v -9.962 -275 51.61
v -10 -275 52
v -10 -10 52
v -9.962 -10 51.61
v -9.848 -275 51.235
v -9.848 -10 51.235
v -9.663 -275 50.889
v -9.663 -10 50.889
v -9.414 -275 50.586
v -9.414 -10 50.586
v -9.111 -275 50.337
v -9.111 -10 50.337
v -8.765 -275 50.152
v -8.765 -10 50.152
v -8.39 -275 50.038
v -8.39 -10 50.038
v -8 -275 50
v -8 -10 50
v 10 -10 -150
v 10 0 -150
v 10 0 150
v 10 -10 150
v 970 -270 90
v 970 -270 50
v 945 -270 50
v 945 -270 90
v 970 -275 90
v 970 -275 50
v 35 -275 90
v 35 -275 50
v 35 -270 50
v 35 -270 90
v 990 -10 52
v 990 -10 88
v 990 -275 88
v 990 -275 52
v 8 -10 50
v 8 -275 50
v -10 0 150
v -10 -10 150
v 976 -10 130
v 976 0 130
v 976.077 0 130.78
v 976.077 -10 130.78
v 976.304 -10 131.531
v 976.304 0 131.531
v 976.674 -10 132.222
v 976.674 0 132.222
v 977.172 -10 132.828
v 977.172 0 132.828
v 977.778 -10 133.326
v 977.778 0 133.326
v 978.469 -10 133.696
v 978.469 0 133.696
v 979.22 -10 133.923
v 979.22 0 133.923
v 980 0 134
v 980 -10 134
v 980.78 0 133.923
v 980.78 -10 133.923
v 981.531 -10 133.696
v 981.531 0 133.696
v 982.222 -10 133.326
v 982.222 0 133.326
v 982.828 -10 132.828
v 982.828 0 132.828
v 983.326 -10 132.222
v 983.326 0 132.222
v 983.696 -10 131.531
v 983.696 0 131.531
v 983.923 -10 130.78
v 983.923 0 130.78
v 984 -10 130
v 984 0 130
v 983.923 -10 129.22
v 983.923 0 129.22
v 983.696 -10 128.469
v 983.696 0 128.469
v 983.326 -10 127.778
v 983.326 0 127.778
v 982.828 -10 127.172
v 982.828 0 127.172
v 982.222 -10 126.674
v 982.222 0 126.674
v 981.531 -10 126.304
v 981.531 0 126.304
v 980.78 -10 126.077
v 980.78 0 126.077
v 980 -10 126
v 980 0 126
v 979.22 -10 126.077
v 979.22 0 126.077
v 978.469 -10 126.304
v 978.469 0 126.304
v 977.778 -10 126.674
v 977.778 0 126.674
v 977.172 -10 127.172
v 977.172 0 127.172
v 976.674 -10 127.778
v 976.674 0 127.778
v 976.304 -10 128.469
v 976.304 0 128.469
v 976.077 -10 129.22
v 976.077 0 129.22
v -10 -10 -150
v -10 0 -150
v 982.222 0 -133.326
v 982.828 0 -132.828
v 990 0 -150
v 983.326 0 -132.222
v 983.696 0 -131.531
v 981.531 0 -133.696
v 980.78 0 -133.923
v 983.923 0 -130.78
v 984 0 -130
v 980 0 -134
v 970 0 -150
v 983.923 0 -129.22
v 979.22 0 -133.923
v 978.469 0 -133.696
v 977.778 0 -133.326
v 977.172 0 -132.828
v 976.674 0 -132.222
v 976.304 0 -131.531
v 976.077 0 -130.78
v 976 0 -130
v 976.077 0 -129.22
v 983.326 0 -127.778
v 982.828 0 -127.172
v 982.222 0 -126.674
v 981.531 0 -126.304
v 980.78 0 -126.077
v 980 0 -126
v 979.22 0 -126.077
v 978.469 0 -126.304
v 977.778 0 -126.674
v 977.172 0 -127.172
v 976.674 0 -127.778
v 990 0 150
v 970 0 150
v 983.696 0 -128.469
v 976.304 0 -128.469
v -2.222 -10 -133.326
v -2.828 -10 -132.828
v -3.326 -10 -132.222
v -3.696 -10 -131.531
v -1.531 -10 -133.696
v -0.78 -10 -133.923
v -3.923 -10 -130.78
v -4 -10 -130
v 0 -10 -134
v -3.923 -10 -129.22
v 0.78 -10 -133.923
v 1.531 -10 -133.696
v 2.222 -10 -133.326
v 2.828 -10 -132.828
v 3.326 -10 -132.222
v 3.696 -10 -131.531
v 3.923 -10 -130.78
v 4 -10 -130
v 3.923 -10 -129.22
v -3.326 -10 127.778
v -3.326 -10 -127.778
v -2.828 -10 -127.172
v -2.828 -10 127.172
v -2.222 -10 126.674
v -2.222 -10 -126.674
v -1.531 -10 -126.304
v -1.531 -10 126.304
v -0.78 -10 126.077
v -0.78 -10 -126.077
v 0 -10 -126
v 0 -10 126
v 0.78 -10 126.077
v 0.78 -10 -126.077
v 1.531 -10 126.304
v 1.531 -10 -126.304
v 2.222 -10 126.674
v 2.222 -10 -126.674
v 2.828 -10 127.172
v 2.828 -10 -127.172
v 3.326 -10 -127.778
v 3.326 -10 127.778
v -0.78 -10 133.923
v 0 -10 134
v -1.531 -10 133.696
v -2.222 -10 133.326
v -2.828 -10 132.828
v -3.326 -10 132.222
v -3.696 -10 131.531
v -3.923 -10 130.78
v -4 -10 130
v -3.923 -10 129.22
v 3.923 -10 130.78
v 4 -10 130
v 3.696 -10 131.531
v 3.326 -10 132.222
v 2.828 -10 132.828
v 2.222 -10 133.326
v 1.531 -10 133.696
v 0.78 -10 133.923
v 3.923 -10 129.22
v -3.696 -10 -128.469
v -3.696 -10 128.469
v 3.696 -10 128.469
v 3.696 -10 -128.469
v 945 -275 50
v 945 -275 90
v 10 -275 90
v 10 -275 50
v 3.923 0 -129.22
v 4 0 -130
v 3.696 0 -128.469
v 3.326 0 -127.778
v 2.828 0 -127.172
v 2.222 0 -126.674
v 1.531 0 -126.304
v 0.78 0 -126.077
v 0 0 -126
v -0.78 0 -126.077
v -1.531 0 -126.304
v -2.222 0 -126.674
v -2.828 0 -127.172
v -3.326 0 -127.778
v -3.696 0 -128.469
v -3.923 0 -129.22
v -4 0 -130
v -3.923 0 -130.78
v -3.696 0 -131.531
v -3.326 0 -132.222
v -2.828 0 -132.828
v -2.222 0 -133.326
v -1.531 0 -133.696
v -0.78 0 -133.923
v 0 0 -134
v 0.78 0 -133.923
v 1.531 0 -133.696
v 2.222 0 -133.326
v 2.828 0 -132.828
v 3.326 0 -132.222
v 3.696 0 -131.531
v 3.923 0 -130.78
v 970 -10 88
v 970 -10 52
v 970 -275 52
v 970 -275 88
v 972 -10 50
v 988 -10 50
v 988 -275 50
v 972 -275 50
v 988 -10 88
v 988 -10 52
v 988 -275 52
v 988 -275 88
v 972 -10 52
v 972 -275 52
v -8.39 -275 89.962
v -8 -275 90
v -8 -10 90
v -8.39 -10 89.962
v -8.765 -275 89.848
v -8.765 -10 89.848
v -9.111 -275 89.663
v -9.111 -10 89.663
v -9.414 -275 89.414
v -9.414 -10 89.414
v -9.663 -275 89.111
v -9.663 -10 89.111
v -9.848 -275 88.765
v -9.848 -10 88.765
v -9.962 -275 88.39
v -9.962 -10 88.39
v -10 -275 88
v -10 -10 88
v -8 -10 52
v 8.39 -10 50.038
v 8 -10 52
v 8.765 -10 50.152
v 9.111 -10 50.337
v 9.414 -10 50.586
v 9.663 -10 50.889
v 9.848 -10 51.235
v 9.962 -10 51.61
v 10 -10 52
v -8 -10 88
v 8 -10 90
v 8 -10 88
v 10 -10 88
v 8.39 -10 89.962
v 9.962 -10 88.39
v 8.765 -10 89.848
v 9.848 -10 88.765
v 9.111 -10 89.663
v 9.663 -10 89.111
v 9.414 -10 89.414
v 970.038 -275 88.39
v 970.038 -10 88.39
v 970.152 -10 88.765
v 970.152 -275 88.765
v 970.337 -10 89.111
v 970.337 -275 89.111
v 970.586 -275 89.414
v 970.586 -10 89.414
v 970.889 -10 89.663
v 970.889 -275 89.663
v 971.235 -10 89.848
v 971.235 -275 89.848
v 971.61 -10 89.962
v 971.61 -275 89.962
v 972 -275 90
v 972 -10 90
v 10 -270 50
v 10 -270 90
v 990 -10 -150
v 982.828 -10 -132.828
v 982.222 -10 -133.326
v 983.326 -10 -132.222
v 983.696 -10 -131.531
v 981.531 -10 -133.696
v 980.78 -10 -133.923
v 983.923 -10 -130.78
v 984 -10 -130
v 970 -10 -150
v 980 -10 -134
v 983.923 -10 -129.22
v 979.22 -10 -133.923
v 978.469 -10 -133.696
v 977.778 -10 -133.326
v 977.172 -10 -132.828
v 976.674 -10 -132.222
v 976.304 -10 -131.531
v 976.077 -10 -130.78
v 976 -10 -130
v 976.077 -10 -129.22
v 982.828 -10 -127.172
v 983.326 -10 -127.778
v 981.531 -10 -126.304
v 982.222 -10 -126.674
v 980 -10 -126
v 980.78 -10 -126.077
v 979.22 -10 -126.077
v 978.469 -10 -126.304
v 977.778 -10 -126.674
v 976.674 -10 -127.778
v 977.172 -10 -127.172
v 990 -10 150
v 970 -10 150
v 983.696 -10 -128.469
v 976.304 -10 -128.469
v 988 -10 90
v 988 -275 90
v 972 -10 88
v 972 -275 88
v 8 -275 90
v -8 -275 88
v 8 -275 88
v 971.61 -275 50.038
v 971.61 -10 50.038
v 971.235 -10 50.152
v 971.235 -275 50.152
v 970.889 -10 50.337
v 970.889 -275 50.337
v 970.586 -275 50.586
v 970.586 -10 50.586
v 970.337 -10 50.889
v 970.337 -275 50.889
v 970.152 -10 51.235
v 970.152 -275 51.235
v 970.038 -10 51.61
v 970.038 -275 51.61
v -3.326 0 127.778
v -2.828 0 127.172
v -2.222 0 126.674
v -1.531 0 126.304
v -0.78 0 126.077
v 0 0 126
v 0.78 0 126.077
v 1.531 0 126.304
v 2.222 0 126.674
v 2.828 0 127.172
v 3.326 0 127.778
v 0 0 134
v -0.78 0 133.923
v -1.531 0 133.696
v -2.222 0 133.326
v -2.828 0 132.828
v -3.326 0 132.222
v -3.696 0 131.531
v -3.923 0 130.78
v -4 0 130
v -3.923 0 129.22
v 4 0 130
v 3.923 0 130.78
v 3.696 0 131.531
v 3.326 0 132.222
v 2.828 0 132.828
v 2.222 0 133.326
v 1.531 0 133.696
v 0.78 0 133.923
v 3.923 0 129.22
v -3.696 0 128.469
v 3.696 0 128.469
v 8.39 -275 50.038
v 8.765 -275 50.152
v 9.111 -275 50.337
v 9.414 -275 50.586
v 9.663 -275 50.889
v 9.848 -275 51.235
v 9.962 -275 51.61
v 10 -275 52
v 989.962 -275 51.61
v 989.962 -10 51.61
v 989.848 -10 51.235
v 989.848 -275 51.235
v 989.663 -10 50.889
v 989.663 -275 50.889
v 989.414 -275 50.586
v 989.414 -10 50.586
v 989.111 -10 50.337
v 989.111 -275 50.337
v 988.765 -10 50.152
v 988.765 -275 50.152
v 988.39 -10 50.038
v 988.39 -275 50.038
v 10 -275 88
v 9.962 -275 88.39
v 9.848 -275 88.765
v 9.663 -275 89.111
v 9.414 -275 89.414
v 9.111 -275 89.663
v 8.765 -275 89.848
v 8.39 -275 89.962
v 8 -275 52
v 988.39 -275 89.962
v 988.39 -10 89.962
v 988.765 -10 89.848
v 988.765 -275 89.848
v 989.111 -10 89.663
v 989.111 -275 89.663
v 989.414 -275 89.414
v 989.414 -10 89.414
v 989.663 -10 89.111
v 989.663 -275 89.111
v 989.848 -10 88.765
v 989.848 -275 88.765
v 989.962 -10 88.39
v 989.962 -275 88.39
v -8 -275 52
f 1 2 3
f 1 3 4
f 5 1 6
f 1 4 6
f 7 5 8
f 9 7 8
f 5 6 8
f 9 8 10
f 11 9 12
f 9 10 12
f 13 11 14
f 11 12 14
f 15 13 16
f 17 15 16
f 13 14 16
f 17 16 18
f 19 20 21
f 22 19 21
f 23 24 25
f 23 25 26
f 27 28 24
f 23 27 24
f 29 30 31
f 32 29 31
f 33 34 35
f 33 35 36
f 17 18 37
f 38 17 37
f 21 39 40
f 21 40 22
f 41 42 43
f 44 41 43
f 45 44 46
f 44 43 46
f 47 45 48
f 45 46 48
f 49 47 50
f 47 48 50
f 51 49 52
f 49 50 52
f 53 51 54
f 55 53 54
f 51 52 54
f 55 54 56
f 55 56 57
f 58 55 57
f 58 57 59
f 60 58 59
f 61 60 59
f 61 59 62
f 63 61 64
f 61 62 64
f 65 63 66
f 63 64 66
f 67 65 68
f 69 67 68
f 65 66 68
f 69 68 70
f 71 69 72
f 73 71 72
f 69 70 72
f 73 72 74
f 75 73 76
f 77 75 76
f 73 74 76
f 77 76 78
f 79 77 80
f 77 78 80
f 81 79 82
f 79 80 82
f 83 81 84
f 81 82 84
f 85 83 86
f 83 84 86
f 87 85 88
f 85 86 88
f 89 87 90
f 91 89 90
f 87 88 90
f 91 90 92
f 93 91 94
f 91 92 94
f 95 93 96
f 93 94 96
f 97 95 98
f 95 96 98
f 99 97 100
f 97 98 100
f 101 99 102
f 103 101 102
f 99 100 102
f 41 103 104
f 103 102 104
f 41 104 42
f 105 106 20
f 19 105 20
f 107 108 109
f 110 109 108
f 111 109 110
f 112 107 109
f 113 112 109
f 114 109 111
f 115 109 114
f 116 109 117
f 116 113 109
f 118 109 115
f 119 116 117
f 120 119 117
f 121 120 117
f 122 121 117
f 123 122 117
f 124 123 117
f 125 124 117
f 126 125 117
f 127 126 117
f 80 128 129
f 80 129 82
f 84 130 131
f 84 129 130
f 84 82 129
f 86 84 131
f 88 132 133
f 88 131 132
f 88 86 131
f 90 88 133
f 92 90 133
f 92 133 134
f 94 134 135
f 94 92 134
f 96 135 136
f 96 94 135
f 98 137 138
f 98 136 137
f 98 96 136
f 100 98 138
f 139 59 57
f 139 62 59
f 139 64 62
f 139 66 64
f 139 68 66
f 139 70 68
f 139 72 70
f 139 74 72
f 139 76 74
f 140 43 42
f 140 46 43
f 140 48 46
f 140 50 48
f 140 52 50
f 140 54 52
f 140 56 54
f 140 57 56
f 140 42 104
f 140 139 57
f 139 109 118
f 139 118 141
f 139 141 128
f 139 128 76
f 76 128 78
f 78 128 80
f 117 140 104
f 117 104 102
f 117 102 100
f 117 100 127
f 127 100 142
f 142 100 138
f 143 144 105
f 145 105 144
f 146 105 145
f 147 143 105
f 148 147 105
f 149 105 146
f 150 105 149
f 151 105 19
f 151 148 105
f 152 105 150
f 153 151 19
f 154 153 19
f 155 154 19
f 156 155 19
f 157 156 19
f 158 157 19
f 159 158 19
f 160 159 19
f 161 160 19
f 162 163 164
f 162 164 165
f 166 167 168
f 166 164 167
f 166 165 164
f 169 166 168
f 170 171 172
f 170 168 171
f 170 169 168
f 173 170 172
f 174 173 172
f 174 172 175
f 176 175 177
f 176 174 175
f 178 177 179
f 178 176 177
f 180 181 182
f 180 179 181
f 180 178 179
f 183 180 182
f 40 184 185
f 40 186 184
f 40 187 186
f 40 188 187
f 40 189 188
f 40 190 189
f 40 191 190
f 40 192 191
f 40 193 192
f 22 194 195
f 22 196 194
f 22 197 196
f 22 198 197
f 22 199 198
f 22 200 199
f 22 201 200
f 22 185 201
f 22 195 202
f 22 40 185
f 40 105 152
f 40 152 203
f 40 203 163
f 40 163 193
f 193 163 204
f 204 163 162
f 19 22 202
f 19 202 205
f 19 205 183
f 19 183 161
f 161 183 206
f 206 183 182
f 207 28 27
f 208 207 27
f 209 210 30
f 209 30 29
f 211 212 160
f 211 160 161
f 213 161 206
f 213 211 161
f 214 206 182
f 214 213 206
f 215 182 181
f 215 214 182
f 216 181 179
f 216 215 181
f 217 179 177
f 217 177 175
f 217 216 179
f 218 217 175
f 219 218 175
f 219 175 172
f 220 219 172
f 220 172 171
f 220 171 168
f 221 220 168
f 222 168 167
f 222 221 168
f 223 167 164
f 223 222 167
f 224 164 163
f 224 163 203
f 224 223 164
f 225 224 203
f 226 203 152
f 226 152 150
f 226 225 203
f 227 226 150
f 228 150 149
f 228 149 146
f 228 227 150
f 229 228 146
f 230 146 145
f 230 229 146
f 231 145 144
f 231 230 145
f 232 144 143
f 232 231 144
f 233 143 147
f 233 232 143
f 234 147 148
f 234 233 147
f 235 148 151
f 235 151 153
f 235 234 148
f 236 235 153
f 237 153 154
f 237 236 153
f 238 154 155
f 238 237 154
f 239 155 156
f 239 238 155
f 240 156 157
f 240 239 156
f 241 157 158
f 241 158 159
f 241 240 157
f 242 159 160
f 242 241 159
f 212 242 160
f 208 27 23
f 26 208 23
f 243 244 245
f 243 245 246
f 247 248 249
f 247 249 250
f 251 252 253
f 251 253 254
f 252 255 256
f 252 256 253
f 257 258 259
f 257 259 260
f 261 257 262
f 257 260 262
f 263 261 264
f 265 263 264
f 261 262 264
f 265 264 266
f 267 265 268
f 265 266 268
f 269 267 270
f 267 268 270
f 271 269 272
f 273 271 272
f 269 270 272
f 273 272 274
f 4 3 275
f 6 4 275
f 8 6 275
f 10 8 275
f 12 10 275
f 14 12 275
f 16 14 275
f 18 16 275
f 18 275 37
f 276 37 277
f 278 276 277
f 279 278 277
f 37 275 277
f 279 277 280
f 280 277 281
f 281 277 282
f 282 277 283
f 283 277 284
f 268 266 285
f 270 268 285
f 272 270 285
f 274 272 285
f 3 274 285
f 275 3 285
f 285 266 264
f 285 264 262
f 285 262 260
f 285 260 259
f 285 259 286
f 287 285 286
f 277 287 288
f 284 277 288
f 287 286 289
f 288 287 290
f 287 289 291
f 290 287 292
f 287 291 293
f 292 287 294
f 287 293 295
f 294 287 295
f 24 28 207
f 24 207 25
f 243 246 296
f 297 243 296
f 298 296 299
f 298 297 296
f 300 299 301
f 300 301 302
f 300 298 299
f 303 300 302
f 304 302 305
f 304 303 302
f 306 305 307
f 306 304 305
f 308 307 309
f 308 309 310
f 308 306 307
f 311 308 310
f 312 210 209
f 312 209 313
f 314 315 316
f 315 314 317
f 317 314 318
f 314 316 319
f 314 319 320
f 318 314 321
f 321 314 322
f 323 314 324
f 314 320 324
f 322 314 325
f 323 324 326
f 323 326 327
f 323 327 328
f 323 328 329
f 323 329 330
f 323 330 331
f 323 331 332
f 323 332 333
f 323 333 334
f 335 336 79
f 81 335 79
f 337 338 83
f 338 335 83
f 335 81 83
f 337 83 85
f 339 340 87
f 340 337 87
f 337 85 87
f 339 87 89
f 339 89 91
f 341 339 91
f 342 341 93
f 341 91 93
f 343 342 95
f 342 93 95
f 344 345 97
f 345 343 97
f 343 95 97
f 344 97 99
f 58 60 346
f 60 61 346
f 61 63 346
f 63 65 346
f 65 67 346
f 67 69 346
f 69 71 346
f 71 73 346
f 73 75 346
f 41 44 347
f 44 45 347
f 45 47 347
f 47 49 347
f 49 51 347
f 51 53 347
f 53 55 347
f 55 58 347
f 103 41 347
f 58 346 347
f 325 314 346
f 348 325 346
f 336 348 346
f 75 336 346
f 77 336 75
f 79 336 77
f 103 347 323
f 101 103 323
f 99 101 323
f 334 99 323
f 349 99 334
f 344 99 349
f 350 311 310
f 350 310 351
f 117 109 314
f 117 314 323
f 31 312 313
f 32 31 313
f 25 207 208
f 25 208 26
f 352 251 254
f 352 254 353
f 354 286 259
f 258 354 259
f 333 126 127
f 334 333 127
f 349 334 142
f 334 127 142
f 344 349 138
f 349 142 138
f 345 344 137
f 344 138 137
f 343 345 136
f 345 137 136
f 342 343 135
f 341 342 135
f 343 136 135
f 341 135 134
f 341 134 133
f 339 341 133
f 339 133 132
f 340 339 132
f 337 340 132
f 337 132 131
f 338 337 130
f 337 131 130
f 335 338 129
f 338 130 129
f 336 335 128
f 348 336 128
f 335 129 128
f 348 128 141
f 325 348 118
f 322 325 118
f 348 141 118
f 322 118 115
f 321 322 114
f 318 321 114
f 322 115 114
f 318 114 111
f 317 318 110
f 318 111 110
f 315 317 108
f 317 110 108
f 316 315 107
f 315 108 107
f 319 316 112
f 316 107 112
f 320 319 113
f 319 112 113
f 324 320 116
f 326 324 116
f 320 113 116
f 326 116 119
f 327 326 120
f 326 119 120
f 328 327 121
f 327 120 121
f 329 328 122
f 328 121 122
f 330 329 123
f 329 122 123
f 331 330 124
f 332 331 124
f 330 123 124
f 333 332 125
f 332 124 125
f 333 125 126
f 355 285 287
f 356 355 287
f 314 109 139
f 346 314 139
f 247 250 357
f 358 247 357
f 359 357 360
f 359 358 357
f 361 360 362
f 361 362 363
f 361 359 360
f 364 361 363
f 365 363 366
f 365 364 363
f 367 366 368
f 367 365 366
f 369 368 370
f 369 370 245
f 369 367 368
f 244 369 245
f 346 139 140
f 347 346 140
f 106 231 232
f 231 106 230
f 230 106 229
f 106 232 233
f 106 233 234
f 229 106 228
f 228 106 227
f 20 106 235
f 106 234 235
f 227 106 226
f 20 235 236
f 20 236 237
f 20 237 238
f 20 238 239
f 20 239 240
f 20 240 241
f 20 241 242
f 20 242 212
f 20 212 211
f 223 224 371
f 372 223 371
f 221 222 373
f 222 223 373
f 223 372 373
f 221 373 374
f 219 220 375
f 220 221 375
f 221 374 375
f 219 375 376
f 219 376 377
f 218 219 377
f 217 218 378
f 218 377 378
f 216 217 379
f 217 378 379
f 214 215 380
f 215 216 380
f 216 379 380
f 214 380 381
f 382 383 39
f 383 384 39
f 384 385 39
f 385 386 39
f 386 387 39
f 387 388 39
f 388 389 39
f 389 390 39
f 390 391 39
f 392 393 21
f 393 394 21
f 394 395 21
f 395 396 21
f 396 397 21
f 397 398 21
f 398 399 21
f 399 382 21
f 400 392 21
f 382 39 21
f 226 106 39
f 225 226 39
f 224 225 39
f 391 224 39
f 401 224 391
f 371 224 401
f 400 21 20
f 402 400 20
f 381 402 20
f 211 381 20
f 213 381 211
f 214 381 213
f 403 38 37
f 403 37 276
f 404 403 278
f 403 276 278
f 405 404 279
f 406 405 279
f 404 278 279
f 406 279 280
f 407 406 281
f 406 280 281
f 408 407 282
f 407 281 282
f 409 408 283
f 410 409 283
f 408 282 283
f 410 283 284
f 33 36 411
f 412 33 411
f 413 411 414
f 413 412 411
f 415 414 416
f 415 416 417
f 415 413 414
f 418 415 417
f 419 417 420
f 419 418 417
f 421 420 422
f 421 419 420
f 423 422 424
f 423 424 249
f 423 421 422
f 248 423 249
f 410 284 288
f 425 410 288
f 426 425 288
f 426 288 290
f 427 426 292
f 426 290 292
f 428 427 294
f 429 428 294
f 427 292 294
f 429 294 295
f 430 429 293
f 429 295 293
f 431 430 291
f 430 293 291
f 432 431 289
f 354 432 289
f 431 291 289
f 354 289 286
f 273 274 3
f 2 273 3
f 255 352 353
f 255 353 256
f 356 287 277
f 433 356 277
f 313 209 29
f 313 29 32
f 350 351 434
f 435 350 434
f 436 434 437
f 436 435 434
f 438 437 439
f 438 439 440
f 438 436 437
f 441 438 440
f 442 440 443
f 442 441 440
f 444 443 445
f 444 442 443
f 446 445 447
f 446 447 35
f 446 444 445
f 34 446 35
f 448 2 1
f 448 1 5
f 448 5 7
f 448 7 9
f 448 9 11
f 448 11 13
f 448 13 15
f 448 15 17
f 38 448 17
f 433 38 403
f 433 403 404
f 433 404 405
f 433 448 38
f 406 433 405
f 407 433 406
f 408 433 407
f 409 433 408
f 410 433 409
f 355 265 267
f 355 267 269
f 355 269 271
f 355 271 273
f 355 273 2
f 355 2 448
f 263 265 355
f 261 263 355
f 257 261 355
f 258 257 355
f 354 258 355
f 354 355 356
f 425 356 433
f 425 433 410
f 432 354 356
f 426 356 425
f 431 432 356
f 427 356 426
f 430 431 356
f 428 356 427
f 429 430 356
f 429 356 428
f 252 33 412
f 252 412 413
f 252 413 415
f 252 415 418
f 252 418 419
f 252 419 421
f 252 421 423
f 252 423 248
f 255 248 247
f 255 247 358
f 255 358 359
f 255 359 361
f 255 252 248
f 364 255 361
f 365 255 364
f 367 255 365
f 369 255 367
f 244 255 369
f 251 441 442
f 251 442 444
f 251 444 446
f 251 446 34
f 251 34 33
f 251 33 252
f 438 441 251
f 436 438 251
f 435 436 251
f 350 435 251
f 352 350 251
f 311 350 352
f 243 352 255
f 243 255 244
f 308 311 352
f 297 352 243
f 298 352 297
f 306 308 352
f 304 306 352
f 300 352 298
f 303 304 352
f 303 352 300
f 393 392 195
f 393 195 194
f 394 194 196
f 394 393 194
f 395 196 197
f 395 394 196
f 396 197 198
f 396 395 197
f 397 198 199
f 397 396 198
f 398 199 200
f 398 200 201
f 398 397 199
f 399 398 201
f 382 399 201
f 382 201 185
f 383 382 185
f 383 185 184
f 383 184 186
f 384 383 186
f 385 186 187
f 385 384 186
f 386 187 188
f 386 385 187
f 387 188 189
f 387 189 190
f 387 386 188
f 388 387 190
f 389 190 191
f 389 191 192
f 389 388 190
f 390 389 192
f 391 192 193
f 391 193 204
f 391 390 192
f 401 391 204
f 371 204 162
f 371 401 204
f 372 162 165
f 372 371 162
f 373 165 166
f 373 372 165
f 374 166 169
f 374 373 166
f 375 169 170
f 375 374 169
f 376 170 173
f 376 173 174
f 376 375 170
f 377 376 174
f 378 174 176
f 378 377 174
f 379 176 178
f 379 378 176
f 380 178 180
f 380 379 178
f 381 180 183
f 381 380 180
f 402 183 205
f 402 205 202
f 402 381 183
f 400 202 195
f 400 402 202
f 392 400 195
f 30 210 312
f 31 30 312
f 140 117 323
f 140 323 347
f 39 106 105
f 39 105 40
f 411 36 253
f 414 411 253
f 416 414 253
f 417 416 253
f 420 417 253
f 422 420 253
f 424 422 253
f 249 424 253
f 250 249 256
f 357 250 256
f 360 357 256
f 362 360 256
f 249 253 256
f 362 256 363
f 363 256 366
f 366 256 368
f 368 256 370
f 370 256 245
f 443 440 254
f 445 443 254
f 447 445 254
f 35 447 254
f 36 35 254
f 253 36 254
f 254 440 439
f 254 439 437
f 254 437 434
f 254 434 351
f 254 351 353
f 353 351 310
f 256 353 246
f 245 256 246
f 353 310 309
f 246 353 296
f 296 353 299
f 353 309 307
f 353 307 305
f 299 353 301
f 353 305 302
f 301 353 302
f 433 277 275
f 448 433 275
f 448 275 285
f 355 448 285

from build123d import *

# Parameters (mm, degrees)
F0_W     = 20
F0_H     = 300
F0_R     = 4
F1_DEPTH = 10
F3_DEPTH = 265
F6_W     = 5
F6_H     = 40
F7_DEPTH = 25


with BuildPart() as f1:
    # F0 (on Front) → F1 (new body)
    with BuildSketch(Plane.XZ):
        Rectangle(F0_W, F0_H)
        with Locations((0, -130)):
            Circle(F0_R, mode=Mode.SUBTRACT)
        with Locations((0, 130)):
            Circle(F0_R, mode=Mode.SUBTRACT)
    extrude(amount=F1_DEPTH)


with BuildPart() as f3:
    # F2 (on face) → F3 (new body)
    with BuildSketch(Plane.XZ.offset(10)):
        with BuildLine():
            Line((0, 90), (-8, 90))
            ThreePointArc((-8, 90), (-9.414214, 89.414214), (-10, 88))
            Line((-10, 88), (-10, 52))
            ThreePointArc((-10, 52), (-9.414214, 50.585786), (-8, 50))
            Line((-8, 50), (0, 50))
            Line((0, 50), (0, 52))
            Line((0, 52), (-8, 52))
            Line((-8, 52), (-8, 88))
            Line((-8, 88), (0, 88))
            Line((0, 88), (0, 90))
        make_face()
        with BuildLine():
            Line((8, 90), (0, 90))
            Line((0, 90), (0, 88))
            Line((0, 88), (8, 88))
            Line((8, 88), (8, 52))
            Line((8, 52), (0, 52))
            Line((0, 52), (0, 50))
            Line((0, 50), (8, 50))
            ThreePointArc((8, 50), (9.414214, 50.585786), (10, 52))
            Line((10, 52), (10, 88))
            ThreePointArc((10, 88), (9.414214, 89.414214), (8, 90))
        make_face()
    extrude(amount=F3_DEPTH)


with BuildPart() as f7:
    # F6 (on face) → F7 (new body)
    with BuildSketch(Plane.YZ.offset(10)):
        with Locations((-272.5, 70)):
            Rectangle(F6_W, F6_H)
    extrude(amount=F7_DEPTH)


with BuildPart() as f8_1:
    # F8: instance of F1
    add(f1.part.mirror(Plane.YZ.offset(490)))


with BuildPart() as f8_2:
    # F8: instance of F3
    add(f3.part.mirror(Plane.YZ.offset(490)))


with BuildPart() as f8_3:
    # F8: instance of F7
    add(f7.part.mirror(Plane.YZ.offset(490)))


solid = Compound([f1.part, f3.part, f7.part, f8_1.part, f8_2.part, f8_3.part])
